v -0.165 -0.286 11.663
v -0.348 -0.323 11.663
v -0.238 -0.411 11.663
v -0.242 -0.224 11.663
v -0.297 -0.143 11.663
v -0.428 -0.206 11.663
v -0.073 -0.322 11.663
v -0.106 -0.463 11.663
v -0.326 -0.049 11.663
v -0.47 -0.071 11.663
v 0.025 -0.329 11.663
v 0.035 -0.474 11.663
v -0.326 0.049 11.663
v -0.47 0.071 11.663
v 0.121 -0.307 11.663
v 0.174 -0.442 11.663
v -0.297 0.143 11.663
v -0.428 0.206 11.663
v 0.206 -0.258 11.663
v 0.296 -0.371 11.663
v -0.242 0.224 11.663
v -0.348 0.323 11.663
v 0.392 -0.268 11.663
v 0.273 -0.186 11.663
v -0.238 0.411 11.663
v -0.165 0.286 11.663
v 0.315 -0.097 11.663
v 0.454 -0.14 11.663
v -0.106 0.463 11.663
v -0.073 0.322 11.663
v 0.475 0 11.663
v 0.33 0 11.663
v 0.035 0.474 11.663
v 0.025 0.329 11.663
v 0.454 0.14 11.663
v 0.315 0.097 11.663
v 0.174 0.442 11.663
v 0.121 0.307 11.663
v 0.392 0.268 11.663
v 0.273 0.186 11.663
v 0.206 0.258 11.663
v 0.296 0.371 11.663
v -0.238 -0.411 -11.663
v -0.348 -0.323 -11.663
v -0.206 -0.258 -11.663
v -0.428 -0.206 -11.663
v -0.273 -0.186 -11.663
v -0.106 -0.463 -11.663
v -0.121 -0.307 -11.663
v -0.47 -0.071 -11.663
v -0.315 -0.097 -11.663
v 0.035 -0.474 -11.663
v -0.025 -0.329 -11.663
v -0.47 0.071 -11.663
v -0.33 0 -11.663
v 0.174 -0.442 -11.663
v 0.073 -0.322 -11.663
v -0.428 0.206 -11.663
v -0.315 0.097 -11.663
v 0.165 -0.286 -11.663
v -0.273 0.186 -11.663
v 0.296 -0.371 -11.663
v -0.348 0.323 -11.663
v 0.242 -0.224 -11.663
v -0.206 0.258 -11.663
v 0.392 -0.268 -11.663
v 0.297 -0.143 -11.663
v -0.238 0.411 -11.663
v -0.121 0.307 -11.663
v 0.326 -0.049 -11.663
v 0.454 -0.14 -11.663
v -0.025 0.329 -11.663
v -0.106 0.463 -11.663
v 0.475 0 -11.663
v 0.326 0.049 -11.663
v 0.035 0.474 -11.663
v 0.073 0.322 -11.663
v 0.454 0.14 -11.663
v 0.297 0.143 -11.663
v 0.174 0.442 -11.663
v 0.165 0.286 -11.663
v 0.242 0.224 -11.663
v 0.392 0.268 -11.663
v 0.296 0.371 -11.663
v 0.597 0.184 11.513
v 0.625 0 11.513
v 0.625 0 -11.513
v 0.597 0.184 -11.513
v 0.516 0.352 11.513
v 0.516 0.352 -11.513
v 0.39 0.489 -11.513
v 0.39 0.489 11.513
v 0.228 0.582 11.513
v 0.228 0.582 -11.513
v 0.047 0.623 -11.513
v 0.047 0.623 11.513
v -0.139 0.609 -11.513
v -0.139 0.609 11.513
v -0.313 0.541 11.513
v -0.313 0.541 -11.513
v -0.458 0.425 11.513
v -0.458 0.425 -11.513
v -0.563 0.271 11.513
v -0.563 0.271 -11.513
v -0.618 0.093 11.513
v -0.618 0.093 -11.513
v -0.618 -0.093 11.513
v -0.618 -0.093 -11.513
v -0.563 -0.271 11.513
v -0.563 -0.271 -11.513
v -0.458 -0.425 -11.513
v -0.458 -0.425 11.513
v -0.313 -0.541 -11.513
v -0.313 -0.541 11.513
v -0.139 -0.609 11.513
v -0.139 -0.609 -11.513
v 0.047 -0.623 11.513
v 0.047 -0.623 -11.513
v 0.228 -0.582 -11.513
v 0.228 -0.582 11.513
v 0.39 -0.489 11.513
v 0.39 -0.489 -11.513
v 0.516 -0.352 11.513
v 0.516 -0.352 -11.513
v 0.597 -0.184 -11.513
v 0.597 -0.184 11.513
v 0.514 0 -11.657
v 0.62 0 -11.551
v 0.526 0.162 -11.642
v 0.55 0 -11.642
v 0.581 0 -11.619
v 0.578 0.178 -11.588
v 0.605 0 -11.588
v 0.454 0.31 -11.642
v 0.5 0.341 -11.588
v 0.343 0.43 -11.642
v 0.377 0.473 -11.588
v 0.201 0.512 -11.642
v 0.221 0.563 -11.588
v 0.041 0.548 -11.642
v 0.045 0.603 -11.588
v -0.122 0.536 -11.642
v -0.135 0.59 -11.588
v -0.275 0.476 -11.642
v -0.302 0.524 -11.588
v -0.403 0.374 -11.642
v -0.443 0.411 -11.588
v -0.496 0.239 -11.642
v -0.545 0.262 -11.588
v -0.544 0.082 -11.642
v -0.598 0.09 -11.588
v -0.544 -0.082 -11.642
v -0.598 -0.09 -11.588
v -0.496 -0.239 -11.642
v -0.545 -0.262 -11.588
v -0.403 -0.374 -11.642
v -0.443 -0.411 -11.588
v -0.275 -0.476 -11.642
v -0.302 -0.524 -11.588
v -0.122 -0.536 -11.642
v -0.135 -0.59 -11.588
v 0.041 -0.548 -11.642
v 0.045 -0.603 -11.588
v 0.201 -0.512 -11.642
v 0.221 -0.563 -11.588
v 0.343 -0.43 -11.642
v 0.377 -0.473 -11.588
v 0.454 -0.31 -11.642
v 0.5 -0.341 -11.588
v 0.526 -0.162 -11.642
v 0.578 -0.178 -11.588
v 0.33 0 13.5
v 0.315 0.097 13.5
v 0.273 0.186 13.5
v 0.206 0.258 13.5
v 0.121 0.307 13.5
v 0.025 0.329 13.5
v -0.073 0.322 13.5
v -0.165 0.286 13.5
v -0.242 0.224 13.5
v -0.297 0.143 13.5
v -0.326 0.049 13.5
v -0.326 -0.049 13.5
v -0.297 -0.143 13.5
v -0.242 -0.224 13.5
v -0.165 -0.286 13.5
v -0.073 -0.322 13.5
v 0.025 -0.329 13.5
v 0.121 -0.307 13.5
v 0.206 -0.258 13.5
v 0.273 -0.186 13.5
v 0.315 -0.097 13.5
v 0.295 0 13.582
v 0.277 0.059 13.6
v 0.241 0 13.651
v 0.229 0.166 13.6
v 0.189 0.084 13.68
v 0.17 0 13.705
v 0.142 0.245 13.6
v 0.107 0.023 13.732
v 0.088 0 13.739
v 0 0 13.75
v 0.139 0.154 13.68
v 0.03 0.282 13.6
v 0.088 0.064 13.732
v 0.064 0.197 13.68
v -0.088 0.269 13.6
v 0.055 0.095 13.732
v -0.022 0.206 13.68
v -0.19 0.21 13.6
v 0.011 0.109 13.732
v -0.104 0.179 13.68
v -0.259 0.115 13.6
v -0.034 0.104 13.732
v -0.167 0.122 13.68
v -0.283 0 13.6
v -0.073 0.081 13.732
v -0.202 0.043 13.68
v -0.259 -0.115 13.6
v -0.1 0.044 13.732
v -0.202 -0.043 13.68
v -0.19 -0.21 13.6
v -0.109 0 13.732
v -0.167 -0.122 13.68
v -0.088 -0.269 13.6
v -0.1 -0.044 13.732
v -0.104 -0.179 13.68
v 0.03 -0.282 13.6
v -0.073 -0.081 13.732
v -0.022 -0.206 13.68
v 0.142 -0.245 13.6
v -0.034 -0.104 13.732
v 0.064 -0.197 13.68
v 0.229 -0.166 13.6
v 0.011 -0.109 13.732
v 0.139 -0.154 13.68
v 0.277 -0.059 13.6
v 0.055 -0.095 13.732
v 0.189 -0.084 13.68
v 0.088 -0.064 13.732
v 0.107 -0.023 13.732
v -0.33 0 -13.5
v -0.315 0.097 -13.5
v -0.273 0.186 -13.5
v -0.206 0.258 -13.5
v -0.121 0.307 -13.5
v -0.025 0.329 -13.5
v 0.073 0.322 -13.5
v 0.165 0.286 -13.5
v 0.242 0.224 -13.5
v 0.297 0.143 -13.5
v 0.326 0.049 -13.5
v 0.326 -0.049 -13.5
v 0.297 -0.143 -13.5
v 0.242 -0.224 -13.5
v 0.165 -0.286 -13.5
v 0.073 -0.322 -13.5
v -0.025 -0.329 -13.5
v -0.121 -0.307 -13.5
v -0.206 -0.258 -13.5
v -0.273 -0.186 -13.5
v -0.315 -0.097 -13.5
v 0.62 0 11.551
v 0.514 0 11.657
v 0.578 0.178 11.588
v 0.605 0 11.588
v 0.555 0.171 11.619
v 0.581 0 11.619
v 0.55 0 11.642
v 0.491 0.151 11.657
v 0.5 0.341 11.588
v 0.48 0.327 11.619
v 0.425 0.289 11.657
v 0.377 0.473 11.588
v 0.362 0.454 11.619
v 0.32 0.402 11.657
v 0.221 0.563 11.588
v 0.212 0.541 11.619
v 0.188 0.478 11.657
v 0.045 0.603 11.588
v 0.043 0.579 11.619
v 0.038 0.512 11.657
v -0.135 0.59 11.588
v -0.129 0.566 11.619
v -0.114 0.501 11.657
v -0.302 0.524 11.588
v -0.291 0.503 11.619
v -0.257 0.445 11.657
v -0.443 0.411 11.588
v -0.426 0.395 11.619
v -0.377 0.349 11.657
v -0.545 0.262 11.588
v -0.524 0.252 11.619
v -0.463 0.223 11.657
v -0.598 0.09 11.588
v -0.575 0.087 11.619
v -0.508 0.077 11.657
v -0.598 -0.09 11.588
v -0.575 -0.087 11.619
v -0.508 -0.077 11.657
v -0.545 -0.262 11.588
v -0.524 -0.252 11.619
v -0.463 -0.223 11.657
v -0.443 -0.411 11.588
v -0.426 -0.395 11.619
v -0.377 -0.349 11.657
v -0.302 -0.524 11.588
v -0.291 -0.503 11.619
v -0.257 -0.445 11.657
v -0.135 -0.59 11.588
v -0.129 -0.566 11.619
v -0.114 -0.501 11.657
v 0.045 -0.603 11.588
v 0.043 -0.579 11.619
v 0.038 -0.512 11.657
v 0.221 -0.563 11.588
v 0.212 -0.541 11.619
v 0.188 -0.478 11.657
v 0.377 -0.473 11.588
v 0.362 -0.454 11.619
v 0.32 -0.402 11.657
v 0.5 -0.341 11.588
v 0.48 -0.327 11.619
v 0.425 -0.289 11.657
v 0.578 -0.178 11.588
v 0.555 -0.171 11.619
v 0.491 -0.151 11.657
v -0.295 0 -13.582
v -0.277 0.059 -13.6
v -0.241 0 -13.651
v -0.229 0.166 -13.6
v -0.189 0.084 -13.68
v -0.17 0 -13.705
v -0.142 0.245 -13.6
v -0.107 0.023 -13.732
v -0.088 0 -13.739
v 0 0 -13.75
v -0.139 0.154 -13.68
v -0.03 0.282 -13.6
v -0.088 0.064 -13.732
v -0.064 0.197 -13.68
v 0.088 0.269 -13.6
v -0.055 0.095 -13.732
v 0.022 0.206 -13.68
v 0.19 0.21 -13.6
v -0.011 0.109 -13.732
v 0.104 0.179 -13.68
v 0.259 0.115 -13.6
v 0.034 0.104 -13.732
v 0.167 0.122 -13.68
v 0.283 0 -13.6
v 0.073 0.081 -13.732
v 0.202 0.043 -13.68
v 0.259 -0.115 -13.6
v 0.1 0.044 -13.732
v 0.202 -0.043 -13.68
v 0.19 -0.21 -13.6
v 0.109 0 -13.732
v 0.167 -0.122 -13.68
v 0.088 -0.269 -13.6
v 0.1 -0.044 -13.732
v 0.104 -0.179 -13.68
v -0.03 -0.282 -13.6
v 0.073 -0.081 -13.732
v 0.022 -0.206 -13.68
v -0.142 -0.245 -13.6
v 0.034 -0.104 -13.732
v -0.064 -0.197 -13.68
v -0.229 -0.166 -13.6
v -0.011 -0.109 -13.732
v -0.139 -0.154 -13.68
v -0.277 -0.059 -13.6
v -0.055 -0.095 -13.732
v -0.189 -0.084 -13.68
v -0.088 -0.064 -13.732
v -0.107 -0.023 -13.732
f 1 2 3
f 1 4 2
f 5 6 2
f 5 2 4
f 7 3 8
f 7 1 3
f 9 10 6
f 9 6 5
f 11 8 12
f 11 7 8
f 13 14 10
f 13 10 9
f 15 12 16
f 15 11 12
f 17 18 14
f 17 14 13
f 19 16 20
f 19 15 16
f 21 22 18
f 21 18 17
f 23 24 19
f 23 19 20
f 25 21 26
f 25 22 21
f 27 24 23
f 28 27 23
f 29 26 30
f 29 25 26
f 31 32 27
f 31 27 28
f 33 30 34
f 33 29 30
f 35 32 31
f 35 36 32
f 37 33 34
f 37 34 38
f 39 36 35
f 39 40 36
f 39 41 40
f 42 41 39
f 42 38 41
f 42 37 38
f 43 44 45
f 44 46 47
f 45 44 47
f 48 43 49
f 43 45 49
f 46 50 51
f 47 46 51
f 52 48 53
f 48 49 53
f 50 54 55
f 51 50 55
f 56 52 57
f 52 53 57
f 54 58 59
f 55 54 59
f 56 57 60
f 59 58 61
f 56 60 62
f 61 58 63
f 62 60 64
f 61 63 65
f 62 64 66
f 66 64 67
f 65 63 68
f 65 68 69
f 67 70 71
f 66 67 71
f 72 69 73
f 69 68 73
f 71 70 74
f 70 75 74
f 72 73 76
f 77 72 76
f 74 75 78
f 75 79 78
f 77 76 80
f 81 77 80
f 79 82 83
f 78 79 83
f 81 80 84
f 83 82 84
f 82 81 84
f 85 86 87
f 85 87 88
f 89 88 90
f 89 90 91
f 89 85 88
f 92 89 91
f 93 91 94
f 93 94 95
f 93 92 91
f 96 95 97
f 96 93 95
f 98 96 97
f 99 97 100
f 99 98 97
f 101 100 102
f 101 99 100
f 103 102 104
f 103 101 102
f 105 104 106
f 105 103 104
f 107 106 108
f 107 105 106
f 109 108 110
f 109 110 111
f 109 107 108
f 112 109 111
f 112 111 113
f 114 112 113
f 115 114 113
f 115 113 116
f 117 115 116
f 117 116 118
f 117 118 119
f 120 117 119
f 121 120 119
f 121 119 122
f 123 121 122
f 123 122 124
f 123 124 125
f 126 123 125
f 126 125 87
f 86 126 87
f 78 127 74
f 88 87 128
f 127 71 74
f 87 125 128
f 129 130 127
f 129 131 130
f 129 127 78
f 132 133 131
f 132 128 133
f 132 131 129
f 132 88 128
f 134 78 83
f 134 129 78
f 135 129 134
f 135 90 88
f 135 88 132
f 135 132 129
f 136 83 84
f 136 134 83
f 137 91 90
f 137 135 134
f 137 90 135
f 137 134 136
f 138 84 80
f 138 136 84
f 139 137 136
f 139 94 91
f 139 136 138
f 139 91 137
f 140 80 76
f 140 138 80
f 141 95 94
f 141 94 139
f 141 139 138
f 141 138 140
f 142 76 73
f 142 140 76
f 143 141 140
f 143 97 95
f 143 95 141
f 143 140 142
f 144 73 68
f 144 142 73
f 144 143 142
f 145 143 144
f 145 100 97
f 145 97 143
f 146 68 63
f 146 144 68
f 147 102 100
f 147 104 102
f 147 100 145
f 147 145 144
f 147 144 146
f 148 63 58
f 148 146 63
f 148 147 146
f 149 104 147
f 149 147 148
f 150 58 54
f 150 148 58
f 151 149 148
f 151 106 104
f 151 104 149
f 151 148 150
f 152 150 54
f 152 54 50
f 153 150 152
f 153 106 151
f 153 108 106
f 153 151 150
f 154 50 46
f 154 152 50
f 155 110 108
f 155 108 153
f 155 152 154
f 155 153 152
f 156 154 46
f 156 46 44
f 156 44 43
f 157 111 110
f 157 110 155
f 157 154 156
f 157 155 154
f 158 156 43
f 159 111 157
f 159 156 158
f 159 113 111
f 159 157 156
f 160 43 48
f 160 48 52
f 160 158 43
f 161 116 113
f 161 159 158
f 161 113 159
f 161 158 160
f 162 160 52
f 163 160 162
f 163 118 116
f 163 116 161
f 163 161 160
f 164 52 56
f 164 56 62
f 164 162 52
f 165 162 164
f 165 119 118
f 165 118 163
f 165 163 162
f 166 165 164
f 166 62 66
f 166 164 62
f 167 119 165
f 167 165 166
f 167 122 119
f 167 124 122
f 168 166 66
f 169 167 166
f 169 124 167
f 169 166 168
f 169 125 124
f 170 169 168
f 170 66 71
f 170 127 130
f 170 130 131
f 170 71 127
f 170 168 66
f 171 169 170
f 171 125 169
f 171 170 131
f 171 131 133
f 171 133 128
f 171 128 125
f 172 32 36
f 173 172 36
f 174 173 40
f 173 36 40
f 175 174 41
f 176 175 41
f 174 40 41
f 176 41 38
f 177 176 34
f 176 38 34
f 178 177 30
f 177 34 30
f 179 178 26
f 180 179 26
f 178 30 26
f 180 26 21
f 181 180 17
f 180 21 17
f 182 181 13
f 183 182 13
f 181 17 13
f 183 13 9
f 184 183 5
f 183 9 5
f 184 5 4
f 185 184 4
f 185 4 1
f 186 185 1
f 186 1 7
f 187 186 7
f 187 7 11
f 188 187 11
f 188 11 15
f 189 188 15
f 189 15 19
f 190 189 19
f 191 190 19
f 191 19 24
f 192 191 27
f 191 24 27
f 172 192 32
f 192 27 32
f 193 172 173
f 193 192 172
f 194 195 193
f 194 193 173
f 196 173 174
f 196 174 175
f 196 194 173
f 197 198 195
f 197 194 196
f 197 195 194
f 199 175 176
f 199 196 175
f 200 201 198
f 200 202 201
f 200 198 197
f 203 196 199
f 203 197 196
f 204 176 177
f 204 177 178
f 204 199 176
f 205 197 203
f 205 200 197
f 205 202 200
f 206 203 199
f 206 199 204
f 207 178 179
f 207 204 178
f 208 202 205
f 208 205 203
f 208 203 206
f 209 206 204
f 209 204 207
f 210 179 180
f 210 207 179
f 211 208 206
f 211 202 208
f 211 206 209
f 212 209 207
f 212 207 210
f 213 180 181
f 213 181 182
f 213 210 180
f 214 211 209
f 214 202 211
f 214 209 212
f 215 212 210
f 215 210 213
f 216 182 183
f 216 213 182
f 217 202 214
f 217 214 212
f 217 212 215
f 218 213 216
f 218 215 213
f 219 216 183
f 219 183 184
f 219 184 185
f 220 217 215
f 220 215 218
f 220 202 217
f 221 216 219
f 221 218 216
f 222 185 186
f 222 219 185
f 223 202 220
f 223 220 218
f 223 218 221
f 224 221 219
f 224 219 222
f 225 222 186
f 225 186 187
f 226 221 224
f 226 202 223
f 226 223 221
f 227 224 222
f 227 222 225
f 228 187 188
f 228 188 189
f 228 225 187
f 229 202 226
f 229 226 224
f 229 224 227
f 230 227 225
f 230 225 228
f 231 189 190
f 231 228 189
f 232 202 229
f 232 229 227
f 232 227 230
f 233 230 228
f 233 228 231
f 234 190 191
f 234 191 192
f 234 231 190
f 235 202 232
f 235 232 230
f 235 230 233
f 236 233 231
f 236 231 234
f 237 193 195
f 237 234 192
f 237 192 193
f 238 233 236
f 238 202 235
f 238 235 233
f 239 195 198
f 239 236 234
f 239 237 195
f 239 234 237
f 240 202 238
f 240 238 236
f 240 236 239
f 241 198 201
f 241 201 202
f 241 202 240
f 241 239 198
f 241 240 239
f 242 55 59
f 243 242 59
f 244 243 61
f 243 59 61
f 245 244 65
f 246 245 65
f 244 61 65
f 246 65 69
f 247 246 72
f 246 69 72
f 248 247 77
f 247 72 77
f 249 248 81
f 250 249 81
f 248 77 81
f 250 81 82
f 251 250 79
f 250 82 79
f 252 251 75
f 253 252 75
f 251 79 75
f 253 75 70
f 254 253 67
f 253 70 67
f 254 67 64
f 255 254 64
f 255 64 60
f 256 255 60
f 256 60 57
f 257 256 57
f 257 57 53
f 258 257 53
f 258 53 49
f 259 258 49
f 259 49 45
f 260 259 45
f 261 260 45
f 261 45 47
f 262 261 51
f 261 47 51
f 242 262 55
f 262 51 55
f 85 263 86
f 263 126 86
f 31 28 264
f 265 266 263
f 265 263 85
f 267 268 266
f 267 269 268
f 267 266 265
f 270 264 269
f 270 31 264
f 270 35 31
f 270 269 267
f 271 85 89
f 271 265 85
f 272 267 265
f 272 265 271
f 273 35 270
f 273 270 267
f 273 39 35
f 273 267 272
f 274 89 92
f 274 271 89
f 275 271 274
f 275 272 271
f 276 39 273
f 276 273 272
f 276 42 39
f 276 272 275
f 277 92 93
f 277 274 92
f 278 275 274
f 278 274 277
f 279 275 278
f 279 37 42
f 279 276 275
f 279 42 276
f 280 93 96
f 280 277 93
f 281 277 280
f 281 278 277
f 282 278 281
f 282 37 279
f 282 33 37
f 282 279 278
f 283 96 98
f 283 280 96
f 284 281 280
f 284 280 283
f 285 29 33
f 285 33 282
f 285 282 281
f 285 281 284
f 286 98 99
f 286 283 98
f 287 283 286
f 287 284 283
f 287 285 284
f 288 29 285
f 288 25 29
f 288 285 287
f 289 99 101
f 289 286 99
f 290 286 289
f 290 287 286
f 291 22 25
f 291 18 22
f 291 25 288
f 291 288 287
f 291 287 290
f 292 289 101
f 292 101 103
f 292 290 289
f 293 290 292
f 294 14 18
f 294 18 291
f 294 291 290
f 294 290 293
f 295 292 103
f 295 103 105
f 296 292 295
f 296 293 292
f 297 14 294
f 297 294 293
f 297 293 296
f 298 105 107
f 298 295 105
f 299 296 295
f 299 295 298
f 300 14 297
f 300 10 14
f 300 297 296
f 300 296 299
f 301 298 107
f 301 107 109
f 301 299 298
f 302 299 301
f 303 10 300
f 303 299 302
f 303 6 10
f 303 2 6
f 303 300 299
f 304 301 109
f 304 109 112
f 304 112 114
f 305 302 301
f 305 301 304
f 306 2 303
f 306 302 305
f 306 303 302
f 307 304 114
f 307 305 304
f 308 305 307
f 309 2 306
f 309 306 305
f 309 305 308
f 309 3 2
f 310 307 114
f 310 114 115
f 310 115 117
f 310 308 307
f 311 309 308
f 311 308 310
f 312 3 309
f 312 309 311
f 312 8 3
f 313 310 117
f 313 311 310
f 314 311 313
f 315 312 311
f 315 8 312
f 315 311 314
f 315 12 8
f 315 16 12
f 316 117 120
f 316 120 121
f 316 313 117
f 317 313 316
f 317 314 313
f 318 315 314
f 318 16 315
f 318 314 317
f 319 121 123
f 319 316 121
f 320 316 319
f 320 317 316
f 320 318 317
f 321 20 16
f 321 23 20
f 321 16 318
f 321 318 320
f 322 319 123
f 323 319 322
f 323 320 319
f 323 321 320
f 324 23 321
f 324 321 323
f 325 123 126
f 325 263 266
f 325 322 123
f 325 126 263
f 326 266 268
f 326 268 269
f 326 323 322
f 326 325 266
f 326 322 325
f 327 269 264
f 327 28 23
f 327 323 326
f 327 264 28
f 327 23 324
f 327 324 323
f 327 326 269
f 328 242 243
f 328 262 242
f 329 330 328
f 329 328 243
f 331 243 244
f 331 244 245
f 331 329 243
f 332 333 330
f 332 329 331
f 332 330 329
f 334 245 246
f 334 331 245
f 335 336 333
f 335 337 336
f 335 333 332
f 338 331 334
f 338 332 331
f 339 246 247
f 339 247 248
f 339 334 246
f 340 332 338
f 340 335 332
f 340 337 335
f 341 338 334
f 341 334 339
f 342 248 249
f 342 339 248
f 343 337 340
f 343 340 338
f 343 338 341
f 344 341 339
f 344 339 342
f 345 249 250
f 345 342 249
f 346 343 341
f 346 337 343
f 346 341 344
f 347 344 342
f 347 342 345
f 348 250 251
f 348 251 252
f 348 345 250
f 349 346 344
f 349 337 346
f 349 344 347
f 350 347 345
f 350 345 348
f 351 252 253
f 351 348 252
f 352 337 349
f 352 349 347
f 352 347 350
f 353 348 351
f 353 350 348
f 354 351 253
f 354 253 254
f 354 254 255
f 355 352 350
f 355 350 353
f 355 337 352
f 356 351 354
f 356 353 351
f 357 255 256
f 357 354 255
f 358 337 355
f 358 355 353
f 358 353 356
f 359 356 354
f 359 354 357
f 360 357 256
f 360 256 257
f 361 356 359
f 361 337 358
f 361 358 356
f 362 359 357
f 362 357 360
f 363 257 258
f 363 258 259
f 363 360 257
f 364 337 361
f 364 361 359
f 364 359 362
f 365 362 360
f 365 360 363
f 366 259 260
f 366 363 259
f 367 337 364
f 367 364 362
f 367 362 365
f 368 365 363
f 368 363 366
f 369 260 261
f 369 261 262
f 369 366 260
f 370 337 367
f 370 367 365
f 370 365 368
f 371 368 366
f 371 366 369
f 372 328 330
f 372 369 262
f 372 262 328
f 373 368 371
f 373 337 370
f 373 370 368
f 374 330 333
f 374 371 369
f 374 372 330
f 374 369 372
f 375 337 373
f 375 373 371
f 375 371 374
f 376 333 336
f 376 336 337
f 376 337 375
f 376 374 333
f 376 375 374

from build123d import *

# Parameters (mm, degrees)
ESQUISSE1_R             = 0.625
BOSS_EXTRU_1_DEPTH      = 11.662554
BOSS_EXTRU_1_DEPTH_BACK = 11.662554
ESQUISSE2_R             = 0.33
BOSS_EXTRU_2_DEPTH      = 1.837446
ESQUISSE3_R             = 0.33
BOSS_EXTRU_3_DEPTH      = 1.837446
D_ME1_FACE_RADIUS       = 0.33
D_ME1_HEIGHT            = 0.25
D_ME2_FACE_RADIUS       = 0.33
D_ME2_HEIGHT            = 0.25
CONG_1_R                = 0.15


with BuildPart() as part:
    # Esquisse1 → Boss.-Extru.1 (new body, two sides)
    with BuildSketch(Plane.XY) as boss_extru_1_sk:
        Circle(ESQUISSE1_R)
    extrude(amount=BOSS_EXTRU_1_DEPTH)
    extrude(boss_extru_1_sk.sketch, amount=-BOSS_EXTRU_1_DEPTH_BACK)

    # Esquisse2 → Boss.-Extru.2 (add)
    with BuildSketch(Plane.XY.offset(11.662554)):
        Circle(ESQUISSE2_R)
    extrude(amount=BOSS_EXTRU_2_DEPTH)

    # Esquisse3 → Boss.-Extru.3 (add)
    with BuildSketch(Plane(origin=(0, 0, -11.662554), x_dir=(-1, 0, 0), z_dir=(0, 0, -1))):
        Circle(ESQUISSE3_R)
    extrude(amount=BOSS_EXTRU_3_DEPTH)

    # D_me1: a dome of height H over a round flat face of radius A is a cap of a sphere of radius (A * A + H * H) / (2 * H)
    d_me1_r = (D_ME1_FACE_RADIUS * D_ME1_FACE_RADIUS + D_ME1_HEIGHT * D_ME1_HEIGHT) / (2 * D_ME1_HEIGHT)
    d_me1_base = Plane((0, 0, 13.5), z_dir=(0, 0, 1))
    with Locations(d_me1_base.offset(D_ME1_HEIGHT - d_me1_r)):
        d_me1_ball = Sphere(d_me1_r, mode=Mode.PRIVATE)
    add(split(d_me1_ball, bisect_by=d_me1_base, keep=Keep.TOP, mode=Mode.PRIVATE))

    # D_me2: a dome of height H over a round flat face of radius A is a cap of a sphere of radius (A * A + H * H) / (2 * H)
    d_me2_r = (D_ME2_FACE_RADIUS * D_ME2_FACE_RADIUS + D_ME2_HEIGHT * D_ME2_HEIGHT) / (2 * D_ME2_HEIGHT)
    d_me2_base = Plane((0, 0, -13.5), z_dir=(0, 0, -1))
    with Locations(d_me2_base.offset(D_ME2_HEIGHT - d_me2_r)):
        d_me2_ball = Sphere(d_me2_r, mode=Mode.PRIVATE)
    add(split(d_me2_ball, bisect_by=d_me2_base, keep=Keep.TOP, mode=Mode.PRIVATE))

    # Cong_1
    cong_1_edges = [part.edges().sort_by_distance(p)[0] for p in [
        (-0.625, 0, -11.662554),
        (-0.625, 0, 11.662554),
    ]]
    fillet(cong_1_edges, radius=CONG_1_R)


solid = part.part
